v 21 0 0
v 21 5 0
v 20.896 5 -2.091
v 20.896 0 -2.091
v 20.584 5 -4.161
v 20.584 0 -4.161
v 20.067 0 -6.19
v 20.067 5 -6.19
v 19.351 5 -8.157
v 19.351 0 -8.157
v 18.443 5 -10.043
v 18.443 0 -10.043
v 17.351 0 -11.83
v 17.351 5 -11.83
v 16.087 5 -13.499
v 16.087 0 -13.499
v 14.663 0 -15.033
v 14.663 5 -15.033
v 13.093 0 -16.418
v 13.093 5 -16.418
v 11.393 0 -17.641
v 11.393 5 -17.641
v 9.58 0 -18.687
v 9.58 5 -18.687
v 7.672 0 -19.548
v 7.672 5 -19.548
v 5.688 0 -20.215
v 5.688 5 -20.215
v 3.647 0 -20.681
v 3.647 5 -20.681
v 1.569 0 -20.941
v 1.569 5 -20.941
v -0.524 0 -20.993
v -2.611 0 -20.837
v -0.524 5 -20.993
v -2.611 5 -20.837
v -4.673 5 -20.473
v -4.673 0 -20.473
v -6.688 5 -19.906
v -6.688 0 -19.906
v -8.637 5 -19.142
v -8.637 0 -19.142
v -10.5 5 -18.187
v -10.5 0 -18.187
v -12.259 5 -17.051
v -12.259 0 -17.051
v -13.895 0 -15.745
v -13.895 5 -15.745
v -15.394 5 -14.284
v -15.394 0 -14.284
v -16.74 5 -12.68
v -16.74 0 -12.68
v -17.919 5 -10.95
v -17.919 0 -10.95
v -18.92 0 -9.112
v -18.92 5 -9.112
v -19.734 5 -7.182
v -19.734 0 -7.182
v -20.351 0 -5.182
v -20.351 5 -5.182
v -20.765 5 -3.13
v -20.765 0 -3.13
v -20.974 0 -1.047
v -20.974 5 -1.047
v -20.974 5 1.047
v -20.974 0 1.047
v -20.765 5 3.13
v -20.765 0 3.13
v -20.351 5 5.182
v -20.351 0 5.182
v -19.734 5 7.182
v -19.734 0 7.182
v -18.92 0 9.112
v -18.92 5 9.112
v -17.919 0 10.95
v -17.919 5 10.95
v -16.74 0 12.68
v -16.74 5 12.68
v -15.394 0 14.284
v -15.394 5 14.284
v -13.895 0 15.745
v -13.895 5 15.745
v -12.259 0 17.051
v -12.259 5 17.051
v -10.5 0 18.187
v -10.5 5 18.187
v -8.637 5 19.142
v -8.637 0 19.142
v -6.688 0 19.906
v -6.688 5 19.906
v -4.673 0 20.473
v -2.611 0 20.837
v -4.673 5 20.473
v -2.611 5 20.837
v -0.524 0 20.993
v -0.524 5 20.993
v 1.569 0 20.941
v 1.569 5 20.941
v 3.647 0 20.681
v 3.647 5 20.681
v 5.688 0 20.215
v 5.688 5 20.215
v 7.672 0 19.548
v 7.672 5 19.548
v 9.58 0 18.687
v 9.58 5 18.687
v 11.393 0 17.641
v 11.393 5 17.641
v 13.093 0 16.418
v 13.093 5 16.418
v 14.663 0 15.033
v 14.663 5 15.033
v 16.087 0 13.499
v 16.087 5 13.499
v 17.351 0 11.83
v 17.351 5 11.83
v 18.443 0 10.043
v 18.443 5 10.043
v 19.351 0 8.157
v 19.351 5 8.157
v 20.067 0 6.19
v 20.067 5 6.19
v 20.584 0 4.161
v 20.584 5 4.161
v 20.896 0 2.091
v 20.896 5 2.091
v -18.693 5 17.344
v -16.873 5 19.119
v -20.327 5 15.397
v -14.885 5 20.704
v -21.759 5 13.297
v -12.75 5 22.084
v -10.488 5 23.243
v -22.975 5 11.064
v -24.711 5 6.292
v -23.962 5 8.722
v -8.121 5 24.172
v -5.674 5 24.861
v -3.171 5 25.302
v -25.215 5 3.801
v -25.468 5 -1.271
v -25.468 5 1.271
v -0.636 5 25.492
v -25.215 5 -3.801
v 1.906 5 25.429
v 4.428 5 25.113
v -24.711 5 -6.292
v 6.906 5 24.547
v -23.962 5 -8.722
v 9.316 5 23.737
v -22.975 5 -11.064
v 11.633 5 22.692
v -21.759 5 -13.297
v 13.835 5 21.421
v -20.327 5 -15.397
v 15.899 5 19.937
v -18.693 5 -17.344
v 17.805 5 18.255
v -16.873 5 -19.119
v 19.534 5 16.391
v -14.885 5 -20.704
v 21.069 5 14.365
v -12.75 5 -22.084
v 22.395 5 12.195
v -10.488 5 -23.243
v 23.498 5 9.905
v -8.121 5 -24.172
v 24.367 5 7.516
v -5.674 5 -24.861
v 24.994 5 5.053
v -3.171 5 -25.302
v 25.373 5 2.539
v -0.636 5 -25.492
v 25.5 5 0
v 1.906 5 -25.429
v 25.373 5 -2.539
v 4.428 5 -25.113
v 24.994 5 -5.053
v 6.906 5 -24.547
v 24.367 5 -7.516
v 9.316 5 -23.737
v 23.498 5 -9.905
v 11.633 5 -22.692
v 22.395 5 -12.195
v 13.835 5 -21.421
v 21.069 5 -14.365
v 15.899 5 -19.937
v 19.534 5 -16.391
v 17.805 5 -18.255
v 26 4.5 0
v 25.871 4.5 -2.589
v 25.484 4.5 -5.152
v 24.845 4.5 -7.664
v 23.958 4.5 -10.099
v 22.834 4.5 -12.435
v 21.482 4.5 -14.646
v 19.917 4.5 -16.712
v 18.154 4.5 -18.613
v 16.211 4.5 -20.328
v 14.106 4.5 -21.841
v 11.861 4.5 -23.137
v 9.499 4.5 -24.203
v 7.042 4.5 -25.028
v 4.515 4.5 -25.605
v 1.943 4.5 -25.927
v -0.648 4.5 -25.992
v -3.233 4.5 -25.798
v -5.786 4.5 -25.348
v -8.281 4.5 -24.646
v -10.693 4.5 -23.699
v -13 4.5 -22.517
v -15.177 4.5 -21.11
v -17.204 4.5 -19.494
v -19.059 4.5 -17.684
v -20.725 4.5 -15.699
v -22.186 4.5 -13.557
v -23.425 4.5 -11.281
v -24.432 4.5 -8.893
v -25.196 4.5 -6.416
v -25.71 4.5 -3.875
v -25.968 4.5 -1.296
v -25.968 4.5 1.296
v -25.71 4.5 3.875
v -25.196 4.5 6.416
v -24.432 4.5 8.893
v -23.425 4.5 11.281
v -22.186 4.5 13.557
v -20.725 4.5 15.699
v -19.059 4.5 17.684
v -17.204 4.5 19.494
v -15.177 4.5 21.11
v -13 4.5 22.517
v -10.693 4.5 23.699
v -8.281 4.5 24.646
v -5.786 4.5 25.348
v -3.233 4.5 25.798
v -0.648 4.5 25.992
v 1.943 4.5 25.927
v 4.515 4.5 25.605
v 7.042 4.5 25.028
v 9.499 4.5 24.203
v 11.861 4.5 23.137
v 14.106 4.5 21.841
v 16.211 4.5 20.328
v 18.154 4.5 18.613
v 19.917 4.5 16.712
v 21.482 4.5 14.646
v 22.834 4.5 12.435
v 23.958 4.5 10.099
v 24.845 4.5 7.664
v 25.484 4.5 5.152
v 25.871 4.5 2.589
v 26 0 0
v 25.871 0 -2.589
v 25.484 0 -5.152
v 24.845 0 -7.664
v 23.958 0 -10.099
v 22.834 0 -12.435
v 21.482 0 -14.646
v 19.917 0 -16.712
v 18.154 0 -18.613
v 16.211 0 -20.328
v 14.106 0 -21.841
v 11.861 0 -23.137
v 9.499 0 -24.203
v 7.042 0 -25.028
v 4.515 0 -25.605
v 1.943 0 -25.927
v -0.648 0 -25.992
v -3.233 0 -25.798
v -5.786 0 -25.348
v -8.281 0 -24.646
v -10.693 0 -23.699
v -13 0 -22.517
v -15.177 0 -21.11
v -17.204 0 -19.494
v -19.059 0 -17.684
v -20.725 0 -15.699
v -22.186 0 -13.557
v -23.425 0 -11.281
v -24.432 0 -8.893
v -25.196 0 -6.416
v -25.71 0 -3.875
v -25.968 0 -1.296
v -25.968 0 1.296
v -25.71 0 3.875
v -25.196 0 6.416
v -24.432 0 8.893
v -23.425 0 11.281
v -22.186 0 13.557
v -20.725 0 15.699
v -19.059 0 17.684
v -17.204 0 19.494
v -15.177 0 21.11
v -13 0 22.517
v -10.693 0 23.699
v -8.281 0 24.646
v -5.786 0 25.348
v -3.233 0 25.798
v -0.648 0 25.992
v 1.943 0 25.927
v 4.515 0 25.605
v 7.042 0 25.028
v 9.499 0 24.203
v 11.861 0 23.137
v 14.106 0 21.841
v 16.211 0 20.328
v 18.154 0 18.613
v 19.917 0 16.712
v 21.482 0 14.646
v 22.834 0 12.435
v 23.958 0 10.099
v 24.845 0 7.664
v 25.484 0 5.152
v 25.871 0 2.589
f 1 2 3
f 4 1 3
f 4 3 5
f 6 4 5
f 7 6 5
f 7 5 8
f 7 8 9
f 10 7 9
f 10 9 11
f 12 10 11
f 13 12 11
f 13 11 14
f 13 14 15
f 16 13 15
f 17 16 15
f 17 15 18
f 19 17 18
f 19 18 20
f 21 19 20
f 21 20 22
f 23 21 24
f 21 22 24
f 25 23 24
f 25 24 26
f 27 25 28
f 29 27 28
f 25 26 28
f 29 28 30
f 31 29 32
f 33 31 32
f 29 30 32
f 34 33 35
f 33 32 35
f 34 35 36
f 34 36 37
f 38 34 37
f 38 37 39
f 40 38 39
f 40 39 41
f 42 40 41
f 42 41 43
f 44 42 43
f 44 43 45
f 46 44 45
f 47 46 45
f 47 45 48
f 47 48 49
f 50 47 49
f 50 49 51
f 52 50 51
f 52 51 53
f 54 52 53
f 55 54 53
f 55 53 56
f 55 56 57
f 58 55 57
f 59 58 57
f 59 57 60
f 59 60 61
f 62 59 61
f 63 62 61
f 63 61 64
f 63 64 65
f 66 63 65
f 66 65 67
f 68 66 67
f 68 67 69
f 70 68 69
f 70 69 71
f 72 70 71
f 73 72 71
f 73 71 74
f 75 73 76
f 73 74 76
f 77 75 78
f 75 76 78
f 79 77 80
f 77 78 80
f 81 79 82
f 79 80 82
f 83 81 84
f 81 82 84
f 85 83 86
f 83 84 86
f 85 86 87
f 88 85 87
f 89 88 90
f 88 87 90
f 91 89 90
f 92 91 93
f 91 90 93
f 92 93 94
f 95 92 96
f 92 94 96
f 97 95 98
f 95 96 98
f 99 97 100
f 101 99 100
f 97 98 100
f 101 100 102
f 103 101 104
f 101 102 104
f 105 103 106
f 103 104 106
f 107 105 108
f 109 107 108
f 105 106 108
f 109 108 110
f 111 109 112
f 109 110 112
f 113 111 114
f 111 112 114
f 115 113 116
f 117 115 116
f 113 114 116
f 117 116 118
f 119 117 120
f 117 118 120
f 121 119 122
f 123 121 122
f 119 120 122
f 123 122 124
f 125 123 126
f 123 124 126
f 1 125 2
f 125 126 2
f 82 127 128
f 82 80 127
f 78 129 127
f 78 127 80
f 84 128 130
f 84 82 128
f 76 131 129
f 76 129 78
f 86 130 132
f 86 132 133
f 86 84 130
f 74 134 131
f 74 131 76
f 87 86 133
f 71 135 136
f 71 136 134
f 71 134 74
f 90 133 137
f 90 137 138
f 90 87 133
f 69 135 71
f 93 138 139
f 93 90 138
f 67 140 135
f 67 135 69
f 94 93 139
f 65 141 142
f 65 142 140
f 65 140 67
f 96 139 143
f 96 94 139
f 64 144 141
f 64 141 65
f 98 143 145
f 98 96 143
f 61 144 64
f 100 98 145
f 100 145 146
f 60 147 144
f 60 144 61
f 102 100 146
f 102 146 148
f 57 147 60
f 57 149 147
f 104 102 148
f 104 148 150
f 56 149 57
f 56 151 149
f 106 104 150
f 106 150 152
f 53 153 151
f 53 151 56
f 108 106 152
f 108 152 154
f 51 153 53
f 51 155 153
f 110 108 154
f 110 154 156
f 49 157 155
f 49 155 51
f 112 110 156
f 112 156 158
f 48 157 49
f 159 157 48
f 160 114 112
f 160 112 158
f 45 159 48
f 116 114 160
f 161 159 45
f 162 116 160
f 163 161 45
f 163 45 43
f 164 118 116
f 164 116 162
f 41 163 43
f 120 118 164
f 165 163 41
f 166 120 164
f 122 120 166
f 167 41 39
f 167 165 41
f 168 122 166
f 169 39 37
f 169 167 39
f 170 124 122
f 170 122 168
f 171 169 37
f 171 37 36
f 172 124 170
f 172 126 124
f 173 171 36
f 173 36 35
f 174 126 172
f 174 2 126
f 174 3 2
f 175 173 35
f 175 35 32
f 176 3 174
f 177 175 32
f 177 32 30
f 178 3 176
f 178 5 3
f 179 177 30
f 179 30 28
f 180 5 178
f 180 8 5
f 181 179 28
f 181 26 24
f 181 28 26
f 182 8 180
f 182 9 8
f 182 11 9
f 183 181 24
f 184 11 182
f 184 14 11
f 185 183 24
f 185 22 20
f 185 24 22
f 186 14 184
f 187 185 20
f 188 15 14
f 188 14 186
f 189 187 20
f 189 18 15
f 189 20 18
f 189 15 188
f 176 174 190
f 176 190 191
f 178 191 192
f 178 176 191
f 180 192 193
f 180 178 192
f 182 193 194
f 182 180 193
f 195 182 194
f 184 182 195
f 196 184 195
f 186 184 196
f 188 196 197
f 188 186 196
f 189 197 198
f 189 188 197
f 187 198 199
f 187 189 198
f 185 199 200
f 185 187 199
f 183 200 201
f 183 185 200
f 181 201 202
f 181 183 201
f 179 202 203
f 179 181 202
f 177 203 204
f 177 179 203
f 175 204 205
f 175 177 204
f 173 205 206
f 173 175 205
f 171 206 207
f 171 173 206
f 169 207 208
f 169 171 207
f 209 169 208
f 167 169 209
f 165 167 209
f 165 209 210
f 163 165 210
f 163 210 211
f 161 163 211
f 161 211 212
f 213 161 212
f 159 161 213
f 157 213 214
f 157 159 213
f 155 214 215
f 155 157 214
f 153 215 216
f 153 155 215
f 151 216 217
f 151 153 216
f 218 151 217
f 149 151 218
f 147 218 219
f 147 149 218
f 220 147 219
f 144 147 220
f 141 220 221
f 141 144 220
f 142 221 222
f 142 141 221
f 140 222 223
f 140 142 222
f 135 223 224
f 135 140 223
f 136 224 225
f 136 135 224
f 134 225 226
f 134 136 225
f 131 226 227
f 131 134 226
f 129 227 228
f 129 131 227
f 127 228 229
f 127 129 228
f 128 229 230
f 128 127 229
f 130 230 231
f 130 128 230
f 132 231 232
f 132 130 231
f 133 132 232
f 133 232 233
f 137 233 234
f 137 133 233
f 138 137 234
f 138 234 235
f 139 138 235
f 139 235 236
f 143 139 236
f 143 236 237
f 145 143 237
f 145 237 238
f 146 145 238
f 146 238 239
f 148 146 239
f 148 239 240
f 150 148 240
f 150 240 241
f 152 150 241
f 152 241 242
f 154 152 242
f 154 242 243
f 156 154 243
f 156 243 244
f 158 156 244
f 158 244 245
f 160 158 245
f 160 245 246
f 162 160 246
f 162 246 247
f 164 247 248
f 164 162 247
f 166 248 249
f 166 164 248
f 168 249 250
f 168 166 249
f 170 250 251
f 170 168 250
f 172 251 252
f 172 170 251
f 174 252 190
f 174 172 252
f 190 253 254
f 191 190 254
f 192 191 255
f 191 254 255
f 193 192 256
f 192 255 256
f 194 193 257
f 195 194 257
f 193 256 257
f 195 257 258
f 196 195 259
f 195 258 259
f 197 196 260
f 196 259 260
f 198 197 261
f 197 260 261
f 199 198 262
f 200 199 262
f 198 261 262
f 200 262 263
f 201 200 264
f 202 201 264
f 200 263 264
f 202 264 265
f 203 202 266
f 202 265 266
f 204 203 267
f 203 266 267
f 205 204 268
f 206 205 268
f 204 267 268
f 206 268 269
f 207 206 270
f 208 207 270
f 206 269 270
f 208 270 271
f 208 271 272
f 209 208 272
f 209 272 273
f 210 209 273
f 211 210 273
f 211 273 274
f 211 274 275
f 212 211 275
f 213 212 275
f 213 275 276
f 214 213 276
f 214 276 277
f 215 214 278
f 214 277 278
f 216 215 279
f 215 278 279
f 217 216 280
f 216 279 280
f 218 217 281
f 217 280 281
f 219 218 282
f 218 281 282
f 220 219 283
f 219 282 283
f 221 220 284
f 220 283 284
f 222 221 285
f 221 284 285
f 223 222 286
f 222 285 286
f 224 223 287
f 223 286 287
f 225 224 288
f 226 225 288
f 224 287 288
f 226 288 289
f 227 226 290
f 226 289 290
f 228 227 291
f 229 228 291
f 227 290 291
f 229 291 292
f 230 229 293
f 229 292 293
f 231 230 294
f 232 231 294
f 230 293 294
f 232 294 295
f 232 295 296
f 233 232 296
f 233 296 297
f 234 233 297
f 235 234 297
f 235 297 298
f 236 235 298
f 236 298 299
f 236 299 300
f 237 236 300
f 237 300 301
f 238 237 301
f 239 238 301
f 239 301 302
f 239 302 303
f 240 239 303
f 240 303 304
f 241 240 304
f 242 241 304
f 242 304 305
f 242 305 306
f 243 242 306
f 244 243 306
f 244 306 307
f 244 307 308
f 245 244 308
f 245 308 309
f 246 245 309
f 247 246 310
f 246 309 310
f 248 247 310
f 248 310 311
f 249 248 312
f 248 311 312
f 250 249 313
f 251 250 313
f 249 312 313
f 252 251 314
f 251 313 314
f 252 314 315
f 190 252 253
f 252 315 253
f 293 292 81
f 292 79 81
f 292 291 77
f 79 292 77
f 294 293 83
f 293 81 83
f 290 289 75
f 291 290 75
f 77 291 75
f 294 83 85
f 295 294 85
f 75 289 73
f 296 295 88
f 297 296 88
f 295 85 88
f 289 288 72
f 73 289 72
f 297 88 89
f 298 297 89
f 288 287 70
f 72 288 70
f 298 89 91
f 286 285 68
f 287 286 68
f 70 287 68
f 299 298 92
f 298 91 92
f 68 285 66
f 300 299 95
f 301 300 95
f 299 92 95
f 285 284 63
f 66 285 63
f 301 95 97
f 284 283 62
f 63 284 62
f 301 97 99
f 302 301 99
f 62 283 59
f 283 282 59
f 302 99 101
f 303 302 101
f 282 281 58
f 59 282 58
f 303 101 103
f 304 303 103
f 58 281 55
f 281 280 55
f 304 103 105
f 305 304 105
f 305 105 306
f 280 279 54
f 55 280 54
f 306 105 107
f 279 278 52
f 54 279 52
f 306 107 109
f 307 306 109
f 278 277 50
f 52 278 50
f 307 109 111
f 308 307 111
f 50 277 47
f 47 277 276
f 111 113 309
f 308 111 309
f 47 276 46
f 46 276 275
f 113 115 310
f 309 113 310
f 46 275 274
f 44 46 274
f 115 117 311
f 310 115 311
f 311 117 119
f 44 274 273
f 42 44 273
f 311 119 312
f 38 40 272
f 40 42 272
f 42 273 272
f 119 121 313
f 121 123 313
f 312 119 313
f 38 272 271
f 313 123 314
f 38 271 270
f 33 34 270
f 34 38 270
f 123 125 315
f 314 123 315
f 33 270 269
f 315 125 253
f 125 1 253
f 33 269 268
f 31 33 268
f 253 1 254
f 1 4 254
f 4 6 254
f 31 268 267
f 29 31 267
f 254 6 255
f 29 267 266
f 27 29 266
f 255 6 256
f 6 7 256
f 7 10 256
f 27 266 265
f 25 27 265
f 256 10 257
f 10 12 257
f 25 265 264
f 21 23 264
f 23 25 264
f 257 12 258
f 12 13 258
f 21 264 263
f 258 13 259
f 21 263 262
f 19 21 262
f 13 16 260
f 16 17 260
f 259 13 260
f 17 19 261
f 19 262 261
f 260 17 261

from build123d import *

# Parameters (mm, degrees)
SKETCH_1_R          = 26
EXTRUDE_1_DEPTH     = 5
CHAMFER_1_SIZE      = 0.5
SKETCH_2_R          = 21
CUT_EXTRUDE_1_DEPTH = 10


with BuildPart() as part:
    # 草图1 → 凸台-拉伸1 (new body)
    with BuildSketch(Plane(origin=(0, 0, 0), x_dir=(1, 0, 0), z_dir=(0, 1, 0))):
        Circle(SKETCH_1_R)
    extrude(amount=EXTRUDE_1_DEPTH)

    # 倒角1
    chamfer_1_edges = [part.edges().sort_by_distance(p)[0] for p in [
        (-26, 5, 0),
    ]]
    chamfer(chamfer_1_edges, length=CHAMFER_1_SIZE)

    # 草图2 → 切除-拉伸1 (cut)
    with BuildSketch(Plane(origin=(0, 5, 0), x_dir=(1, 0, 0), z_dir=(0, 1, 0))):
        Circle(SKETCH_2_R)
    extrude(amount=-CUT_EXTRUDE_1_DEPTH, mode=Mode.SUBTRACT)


solid = part.part
